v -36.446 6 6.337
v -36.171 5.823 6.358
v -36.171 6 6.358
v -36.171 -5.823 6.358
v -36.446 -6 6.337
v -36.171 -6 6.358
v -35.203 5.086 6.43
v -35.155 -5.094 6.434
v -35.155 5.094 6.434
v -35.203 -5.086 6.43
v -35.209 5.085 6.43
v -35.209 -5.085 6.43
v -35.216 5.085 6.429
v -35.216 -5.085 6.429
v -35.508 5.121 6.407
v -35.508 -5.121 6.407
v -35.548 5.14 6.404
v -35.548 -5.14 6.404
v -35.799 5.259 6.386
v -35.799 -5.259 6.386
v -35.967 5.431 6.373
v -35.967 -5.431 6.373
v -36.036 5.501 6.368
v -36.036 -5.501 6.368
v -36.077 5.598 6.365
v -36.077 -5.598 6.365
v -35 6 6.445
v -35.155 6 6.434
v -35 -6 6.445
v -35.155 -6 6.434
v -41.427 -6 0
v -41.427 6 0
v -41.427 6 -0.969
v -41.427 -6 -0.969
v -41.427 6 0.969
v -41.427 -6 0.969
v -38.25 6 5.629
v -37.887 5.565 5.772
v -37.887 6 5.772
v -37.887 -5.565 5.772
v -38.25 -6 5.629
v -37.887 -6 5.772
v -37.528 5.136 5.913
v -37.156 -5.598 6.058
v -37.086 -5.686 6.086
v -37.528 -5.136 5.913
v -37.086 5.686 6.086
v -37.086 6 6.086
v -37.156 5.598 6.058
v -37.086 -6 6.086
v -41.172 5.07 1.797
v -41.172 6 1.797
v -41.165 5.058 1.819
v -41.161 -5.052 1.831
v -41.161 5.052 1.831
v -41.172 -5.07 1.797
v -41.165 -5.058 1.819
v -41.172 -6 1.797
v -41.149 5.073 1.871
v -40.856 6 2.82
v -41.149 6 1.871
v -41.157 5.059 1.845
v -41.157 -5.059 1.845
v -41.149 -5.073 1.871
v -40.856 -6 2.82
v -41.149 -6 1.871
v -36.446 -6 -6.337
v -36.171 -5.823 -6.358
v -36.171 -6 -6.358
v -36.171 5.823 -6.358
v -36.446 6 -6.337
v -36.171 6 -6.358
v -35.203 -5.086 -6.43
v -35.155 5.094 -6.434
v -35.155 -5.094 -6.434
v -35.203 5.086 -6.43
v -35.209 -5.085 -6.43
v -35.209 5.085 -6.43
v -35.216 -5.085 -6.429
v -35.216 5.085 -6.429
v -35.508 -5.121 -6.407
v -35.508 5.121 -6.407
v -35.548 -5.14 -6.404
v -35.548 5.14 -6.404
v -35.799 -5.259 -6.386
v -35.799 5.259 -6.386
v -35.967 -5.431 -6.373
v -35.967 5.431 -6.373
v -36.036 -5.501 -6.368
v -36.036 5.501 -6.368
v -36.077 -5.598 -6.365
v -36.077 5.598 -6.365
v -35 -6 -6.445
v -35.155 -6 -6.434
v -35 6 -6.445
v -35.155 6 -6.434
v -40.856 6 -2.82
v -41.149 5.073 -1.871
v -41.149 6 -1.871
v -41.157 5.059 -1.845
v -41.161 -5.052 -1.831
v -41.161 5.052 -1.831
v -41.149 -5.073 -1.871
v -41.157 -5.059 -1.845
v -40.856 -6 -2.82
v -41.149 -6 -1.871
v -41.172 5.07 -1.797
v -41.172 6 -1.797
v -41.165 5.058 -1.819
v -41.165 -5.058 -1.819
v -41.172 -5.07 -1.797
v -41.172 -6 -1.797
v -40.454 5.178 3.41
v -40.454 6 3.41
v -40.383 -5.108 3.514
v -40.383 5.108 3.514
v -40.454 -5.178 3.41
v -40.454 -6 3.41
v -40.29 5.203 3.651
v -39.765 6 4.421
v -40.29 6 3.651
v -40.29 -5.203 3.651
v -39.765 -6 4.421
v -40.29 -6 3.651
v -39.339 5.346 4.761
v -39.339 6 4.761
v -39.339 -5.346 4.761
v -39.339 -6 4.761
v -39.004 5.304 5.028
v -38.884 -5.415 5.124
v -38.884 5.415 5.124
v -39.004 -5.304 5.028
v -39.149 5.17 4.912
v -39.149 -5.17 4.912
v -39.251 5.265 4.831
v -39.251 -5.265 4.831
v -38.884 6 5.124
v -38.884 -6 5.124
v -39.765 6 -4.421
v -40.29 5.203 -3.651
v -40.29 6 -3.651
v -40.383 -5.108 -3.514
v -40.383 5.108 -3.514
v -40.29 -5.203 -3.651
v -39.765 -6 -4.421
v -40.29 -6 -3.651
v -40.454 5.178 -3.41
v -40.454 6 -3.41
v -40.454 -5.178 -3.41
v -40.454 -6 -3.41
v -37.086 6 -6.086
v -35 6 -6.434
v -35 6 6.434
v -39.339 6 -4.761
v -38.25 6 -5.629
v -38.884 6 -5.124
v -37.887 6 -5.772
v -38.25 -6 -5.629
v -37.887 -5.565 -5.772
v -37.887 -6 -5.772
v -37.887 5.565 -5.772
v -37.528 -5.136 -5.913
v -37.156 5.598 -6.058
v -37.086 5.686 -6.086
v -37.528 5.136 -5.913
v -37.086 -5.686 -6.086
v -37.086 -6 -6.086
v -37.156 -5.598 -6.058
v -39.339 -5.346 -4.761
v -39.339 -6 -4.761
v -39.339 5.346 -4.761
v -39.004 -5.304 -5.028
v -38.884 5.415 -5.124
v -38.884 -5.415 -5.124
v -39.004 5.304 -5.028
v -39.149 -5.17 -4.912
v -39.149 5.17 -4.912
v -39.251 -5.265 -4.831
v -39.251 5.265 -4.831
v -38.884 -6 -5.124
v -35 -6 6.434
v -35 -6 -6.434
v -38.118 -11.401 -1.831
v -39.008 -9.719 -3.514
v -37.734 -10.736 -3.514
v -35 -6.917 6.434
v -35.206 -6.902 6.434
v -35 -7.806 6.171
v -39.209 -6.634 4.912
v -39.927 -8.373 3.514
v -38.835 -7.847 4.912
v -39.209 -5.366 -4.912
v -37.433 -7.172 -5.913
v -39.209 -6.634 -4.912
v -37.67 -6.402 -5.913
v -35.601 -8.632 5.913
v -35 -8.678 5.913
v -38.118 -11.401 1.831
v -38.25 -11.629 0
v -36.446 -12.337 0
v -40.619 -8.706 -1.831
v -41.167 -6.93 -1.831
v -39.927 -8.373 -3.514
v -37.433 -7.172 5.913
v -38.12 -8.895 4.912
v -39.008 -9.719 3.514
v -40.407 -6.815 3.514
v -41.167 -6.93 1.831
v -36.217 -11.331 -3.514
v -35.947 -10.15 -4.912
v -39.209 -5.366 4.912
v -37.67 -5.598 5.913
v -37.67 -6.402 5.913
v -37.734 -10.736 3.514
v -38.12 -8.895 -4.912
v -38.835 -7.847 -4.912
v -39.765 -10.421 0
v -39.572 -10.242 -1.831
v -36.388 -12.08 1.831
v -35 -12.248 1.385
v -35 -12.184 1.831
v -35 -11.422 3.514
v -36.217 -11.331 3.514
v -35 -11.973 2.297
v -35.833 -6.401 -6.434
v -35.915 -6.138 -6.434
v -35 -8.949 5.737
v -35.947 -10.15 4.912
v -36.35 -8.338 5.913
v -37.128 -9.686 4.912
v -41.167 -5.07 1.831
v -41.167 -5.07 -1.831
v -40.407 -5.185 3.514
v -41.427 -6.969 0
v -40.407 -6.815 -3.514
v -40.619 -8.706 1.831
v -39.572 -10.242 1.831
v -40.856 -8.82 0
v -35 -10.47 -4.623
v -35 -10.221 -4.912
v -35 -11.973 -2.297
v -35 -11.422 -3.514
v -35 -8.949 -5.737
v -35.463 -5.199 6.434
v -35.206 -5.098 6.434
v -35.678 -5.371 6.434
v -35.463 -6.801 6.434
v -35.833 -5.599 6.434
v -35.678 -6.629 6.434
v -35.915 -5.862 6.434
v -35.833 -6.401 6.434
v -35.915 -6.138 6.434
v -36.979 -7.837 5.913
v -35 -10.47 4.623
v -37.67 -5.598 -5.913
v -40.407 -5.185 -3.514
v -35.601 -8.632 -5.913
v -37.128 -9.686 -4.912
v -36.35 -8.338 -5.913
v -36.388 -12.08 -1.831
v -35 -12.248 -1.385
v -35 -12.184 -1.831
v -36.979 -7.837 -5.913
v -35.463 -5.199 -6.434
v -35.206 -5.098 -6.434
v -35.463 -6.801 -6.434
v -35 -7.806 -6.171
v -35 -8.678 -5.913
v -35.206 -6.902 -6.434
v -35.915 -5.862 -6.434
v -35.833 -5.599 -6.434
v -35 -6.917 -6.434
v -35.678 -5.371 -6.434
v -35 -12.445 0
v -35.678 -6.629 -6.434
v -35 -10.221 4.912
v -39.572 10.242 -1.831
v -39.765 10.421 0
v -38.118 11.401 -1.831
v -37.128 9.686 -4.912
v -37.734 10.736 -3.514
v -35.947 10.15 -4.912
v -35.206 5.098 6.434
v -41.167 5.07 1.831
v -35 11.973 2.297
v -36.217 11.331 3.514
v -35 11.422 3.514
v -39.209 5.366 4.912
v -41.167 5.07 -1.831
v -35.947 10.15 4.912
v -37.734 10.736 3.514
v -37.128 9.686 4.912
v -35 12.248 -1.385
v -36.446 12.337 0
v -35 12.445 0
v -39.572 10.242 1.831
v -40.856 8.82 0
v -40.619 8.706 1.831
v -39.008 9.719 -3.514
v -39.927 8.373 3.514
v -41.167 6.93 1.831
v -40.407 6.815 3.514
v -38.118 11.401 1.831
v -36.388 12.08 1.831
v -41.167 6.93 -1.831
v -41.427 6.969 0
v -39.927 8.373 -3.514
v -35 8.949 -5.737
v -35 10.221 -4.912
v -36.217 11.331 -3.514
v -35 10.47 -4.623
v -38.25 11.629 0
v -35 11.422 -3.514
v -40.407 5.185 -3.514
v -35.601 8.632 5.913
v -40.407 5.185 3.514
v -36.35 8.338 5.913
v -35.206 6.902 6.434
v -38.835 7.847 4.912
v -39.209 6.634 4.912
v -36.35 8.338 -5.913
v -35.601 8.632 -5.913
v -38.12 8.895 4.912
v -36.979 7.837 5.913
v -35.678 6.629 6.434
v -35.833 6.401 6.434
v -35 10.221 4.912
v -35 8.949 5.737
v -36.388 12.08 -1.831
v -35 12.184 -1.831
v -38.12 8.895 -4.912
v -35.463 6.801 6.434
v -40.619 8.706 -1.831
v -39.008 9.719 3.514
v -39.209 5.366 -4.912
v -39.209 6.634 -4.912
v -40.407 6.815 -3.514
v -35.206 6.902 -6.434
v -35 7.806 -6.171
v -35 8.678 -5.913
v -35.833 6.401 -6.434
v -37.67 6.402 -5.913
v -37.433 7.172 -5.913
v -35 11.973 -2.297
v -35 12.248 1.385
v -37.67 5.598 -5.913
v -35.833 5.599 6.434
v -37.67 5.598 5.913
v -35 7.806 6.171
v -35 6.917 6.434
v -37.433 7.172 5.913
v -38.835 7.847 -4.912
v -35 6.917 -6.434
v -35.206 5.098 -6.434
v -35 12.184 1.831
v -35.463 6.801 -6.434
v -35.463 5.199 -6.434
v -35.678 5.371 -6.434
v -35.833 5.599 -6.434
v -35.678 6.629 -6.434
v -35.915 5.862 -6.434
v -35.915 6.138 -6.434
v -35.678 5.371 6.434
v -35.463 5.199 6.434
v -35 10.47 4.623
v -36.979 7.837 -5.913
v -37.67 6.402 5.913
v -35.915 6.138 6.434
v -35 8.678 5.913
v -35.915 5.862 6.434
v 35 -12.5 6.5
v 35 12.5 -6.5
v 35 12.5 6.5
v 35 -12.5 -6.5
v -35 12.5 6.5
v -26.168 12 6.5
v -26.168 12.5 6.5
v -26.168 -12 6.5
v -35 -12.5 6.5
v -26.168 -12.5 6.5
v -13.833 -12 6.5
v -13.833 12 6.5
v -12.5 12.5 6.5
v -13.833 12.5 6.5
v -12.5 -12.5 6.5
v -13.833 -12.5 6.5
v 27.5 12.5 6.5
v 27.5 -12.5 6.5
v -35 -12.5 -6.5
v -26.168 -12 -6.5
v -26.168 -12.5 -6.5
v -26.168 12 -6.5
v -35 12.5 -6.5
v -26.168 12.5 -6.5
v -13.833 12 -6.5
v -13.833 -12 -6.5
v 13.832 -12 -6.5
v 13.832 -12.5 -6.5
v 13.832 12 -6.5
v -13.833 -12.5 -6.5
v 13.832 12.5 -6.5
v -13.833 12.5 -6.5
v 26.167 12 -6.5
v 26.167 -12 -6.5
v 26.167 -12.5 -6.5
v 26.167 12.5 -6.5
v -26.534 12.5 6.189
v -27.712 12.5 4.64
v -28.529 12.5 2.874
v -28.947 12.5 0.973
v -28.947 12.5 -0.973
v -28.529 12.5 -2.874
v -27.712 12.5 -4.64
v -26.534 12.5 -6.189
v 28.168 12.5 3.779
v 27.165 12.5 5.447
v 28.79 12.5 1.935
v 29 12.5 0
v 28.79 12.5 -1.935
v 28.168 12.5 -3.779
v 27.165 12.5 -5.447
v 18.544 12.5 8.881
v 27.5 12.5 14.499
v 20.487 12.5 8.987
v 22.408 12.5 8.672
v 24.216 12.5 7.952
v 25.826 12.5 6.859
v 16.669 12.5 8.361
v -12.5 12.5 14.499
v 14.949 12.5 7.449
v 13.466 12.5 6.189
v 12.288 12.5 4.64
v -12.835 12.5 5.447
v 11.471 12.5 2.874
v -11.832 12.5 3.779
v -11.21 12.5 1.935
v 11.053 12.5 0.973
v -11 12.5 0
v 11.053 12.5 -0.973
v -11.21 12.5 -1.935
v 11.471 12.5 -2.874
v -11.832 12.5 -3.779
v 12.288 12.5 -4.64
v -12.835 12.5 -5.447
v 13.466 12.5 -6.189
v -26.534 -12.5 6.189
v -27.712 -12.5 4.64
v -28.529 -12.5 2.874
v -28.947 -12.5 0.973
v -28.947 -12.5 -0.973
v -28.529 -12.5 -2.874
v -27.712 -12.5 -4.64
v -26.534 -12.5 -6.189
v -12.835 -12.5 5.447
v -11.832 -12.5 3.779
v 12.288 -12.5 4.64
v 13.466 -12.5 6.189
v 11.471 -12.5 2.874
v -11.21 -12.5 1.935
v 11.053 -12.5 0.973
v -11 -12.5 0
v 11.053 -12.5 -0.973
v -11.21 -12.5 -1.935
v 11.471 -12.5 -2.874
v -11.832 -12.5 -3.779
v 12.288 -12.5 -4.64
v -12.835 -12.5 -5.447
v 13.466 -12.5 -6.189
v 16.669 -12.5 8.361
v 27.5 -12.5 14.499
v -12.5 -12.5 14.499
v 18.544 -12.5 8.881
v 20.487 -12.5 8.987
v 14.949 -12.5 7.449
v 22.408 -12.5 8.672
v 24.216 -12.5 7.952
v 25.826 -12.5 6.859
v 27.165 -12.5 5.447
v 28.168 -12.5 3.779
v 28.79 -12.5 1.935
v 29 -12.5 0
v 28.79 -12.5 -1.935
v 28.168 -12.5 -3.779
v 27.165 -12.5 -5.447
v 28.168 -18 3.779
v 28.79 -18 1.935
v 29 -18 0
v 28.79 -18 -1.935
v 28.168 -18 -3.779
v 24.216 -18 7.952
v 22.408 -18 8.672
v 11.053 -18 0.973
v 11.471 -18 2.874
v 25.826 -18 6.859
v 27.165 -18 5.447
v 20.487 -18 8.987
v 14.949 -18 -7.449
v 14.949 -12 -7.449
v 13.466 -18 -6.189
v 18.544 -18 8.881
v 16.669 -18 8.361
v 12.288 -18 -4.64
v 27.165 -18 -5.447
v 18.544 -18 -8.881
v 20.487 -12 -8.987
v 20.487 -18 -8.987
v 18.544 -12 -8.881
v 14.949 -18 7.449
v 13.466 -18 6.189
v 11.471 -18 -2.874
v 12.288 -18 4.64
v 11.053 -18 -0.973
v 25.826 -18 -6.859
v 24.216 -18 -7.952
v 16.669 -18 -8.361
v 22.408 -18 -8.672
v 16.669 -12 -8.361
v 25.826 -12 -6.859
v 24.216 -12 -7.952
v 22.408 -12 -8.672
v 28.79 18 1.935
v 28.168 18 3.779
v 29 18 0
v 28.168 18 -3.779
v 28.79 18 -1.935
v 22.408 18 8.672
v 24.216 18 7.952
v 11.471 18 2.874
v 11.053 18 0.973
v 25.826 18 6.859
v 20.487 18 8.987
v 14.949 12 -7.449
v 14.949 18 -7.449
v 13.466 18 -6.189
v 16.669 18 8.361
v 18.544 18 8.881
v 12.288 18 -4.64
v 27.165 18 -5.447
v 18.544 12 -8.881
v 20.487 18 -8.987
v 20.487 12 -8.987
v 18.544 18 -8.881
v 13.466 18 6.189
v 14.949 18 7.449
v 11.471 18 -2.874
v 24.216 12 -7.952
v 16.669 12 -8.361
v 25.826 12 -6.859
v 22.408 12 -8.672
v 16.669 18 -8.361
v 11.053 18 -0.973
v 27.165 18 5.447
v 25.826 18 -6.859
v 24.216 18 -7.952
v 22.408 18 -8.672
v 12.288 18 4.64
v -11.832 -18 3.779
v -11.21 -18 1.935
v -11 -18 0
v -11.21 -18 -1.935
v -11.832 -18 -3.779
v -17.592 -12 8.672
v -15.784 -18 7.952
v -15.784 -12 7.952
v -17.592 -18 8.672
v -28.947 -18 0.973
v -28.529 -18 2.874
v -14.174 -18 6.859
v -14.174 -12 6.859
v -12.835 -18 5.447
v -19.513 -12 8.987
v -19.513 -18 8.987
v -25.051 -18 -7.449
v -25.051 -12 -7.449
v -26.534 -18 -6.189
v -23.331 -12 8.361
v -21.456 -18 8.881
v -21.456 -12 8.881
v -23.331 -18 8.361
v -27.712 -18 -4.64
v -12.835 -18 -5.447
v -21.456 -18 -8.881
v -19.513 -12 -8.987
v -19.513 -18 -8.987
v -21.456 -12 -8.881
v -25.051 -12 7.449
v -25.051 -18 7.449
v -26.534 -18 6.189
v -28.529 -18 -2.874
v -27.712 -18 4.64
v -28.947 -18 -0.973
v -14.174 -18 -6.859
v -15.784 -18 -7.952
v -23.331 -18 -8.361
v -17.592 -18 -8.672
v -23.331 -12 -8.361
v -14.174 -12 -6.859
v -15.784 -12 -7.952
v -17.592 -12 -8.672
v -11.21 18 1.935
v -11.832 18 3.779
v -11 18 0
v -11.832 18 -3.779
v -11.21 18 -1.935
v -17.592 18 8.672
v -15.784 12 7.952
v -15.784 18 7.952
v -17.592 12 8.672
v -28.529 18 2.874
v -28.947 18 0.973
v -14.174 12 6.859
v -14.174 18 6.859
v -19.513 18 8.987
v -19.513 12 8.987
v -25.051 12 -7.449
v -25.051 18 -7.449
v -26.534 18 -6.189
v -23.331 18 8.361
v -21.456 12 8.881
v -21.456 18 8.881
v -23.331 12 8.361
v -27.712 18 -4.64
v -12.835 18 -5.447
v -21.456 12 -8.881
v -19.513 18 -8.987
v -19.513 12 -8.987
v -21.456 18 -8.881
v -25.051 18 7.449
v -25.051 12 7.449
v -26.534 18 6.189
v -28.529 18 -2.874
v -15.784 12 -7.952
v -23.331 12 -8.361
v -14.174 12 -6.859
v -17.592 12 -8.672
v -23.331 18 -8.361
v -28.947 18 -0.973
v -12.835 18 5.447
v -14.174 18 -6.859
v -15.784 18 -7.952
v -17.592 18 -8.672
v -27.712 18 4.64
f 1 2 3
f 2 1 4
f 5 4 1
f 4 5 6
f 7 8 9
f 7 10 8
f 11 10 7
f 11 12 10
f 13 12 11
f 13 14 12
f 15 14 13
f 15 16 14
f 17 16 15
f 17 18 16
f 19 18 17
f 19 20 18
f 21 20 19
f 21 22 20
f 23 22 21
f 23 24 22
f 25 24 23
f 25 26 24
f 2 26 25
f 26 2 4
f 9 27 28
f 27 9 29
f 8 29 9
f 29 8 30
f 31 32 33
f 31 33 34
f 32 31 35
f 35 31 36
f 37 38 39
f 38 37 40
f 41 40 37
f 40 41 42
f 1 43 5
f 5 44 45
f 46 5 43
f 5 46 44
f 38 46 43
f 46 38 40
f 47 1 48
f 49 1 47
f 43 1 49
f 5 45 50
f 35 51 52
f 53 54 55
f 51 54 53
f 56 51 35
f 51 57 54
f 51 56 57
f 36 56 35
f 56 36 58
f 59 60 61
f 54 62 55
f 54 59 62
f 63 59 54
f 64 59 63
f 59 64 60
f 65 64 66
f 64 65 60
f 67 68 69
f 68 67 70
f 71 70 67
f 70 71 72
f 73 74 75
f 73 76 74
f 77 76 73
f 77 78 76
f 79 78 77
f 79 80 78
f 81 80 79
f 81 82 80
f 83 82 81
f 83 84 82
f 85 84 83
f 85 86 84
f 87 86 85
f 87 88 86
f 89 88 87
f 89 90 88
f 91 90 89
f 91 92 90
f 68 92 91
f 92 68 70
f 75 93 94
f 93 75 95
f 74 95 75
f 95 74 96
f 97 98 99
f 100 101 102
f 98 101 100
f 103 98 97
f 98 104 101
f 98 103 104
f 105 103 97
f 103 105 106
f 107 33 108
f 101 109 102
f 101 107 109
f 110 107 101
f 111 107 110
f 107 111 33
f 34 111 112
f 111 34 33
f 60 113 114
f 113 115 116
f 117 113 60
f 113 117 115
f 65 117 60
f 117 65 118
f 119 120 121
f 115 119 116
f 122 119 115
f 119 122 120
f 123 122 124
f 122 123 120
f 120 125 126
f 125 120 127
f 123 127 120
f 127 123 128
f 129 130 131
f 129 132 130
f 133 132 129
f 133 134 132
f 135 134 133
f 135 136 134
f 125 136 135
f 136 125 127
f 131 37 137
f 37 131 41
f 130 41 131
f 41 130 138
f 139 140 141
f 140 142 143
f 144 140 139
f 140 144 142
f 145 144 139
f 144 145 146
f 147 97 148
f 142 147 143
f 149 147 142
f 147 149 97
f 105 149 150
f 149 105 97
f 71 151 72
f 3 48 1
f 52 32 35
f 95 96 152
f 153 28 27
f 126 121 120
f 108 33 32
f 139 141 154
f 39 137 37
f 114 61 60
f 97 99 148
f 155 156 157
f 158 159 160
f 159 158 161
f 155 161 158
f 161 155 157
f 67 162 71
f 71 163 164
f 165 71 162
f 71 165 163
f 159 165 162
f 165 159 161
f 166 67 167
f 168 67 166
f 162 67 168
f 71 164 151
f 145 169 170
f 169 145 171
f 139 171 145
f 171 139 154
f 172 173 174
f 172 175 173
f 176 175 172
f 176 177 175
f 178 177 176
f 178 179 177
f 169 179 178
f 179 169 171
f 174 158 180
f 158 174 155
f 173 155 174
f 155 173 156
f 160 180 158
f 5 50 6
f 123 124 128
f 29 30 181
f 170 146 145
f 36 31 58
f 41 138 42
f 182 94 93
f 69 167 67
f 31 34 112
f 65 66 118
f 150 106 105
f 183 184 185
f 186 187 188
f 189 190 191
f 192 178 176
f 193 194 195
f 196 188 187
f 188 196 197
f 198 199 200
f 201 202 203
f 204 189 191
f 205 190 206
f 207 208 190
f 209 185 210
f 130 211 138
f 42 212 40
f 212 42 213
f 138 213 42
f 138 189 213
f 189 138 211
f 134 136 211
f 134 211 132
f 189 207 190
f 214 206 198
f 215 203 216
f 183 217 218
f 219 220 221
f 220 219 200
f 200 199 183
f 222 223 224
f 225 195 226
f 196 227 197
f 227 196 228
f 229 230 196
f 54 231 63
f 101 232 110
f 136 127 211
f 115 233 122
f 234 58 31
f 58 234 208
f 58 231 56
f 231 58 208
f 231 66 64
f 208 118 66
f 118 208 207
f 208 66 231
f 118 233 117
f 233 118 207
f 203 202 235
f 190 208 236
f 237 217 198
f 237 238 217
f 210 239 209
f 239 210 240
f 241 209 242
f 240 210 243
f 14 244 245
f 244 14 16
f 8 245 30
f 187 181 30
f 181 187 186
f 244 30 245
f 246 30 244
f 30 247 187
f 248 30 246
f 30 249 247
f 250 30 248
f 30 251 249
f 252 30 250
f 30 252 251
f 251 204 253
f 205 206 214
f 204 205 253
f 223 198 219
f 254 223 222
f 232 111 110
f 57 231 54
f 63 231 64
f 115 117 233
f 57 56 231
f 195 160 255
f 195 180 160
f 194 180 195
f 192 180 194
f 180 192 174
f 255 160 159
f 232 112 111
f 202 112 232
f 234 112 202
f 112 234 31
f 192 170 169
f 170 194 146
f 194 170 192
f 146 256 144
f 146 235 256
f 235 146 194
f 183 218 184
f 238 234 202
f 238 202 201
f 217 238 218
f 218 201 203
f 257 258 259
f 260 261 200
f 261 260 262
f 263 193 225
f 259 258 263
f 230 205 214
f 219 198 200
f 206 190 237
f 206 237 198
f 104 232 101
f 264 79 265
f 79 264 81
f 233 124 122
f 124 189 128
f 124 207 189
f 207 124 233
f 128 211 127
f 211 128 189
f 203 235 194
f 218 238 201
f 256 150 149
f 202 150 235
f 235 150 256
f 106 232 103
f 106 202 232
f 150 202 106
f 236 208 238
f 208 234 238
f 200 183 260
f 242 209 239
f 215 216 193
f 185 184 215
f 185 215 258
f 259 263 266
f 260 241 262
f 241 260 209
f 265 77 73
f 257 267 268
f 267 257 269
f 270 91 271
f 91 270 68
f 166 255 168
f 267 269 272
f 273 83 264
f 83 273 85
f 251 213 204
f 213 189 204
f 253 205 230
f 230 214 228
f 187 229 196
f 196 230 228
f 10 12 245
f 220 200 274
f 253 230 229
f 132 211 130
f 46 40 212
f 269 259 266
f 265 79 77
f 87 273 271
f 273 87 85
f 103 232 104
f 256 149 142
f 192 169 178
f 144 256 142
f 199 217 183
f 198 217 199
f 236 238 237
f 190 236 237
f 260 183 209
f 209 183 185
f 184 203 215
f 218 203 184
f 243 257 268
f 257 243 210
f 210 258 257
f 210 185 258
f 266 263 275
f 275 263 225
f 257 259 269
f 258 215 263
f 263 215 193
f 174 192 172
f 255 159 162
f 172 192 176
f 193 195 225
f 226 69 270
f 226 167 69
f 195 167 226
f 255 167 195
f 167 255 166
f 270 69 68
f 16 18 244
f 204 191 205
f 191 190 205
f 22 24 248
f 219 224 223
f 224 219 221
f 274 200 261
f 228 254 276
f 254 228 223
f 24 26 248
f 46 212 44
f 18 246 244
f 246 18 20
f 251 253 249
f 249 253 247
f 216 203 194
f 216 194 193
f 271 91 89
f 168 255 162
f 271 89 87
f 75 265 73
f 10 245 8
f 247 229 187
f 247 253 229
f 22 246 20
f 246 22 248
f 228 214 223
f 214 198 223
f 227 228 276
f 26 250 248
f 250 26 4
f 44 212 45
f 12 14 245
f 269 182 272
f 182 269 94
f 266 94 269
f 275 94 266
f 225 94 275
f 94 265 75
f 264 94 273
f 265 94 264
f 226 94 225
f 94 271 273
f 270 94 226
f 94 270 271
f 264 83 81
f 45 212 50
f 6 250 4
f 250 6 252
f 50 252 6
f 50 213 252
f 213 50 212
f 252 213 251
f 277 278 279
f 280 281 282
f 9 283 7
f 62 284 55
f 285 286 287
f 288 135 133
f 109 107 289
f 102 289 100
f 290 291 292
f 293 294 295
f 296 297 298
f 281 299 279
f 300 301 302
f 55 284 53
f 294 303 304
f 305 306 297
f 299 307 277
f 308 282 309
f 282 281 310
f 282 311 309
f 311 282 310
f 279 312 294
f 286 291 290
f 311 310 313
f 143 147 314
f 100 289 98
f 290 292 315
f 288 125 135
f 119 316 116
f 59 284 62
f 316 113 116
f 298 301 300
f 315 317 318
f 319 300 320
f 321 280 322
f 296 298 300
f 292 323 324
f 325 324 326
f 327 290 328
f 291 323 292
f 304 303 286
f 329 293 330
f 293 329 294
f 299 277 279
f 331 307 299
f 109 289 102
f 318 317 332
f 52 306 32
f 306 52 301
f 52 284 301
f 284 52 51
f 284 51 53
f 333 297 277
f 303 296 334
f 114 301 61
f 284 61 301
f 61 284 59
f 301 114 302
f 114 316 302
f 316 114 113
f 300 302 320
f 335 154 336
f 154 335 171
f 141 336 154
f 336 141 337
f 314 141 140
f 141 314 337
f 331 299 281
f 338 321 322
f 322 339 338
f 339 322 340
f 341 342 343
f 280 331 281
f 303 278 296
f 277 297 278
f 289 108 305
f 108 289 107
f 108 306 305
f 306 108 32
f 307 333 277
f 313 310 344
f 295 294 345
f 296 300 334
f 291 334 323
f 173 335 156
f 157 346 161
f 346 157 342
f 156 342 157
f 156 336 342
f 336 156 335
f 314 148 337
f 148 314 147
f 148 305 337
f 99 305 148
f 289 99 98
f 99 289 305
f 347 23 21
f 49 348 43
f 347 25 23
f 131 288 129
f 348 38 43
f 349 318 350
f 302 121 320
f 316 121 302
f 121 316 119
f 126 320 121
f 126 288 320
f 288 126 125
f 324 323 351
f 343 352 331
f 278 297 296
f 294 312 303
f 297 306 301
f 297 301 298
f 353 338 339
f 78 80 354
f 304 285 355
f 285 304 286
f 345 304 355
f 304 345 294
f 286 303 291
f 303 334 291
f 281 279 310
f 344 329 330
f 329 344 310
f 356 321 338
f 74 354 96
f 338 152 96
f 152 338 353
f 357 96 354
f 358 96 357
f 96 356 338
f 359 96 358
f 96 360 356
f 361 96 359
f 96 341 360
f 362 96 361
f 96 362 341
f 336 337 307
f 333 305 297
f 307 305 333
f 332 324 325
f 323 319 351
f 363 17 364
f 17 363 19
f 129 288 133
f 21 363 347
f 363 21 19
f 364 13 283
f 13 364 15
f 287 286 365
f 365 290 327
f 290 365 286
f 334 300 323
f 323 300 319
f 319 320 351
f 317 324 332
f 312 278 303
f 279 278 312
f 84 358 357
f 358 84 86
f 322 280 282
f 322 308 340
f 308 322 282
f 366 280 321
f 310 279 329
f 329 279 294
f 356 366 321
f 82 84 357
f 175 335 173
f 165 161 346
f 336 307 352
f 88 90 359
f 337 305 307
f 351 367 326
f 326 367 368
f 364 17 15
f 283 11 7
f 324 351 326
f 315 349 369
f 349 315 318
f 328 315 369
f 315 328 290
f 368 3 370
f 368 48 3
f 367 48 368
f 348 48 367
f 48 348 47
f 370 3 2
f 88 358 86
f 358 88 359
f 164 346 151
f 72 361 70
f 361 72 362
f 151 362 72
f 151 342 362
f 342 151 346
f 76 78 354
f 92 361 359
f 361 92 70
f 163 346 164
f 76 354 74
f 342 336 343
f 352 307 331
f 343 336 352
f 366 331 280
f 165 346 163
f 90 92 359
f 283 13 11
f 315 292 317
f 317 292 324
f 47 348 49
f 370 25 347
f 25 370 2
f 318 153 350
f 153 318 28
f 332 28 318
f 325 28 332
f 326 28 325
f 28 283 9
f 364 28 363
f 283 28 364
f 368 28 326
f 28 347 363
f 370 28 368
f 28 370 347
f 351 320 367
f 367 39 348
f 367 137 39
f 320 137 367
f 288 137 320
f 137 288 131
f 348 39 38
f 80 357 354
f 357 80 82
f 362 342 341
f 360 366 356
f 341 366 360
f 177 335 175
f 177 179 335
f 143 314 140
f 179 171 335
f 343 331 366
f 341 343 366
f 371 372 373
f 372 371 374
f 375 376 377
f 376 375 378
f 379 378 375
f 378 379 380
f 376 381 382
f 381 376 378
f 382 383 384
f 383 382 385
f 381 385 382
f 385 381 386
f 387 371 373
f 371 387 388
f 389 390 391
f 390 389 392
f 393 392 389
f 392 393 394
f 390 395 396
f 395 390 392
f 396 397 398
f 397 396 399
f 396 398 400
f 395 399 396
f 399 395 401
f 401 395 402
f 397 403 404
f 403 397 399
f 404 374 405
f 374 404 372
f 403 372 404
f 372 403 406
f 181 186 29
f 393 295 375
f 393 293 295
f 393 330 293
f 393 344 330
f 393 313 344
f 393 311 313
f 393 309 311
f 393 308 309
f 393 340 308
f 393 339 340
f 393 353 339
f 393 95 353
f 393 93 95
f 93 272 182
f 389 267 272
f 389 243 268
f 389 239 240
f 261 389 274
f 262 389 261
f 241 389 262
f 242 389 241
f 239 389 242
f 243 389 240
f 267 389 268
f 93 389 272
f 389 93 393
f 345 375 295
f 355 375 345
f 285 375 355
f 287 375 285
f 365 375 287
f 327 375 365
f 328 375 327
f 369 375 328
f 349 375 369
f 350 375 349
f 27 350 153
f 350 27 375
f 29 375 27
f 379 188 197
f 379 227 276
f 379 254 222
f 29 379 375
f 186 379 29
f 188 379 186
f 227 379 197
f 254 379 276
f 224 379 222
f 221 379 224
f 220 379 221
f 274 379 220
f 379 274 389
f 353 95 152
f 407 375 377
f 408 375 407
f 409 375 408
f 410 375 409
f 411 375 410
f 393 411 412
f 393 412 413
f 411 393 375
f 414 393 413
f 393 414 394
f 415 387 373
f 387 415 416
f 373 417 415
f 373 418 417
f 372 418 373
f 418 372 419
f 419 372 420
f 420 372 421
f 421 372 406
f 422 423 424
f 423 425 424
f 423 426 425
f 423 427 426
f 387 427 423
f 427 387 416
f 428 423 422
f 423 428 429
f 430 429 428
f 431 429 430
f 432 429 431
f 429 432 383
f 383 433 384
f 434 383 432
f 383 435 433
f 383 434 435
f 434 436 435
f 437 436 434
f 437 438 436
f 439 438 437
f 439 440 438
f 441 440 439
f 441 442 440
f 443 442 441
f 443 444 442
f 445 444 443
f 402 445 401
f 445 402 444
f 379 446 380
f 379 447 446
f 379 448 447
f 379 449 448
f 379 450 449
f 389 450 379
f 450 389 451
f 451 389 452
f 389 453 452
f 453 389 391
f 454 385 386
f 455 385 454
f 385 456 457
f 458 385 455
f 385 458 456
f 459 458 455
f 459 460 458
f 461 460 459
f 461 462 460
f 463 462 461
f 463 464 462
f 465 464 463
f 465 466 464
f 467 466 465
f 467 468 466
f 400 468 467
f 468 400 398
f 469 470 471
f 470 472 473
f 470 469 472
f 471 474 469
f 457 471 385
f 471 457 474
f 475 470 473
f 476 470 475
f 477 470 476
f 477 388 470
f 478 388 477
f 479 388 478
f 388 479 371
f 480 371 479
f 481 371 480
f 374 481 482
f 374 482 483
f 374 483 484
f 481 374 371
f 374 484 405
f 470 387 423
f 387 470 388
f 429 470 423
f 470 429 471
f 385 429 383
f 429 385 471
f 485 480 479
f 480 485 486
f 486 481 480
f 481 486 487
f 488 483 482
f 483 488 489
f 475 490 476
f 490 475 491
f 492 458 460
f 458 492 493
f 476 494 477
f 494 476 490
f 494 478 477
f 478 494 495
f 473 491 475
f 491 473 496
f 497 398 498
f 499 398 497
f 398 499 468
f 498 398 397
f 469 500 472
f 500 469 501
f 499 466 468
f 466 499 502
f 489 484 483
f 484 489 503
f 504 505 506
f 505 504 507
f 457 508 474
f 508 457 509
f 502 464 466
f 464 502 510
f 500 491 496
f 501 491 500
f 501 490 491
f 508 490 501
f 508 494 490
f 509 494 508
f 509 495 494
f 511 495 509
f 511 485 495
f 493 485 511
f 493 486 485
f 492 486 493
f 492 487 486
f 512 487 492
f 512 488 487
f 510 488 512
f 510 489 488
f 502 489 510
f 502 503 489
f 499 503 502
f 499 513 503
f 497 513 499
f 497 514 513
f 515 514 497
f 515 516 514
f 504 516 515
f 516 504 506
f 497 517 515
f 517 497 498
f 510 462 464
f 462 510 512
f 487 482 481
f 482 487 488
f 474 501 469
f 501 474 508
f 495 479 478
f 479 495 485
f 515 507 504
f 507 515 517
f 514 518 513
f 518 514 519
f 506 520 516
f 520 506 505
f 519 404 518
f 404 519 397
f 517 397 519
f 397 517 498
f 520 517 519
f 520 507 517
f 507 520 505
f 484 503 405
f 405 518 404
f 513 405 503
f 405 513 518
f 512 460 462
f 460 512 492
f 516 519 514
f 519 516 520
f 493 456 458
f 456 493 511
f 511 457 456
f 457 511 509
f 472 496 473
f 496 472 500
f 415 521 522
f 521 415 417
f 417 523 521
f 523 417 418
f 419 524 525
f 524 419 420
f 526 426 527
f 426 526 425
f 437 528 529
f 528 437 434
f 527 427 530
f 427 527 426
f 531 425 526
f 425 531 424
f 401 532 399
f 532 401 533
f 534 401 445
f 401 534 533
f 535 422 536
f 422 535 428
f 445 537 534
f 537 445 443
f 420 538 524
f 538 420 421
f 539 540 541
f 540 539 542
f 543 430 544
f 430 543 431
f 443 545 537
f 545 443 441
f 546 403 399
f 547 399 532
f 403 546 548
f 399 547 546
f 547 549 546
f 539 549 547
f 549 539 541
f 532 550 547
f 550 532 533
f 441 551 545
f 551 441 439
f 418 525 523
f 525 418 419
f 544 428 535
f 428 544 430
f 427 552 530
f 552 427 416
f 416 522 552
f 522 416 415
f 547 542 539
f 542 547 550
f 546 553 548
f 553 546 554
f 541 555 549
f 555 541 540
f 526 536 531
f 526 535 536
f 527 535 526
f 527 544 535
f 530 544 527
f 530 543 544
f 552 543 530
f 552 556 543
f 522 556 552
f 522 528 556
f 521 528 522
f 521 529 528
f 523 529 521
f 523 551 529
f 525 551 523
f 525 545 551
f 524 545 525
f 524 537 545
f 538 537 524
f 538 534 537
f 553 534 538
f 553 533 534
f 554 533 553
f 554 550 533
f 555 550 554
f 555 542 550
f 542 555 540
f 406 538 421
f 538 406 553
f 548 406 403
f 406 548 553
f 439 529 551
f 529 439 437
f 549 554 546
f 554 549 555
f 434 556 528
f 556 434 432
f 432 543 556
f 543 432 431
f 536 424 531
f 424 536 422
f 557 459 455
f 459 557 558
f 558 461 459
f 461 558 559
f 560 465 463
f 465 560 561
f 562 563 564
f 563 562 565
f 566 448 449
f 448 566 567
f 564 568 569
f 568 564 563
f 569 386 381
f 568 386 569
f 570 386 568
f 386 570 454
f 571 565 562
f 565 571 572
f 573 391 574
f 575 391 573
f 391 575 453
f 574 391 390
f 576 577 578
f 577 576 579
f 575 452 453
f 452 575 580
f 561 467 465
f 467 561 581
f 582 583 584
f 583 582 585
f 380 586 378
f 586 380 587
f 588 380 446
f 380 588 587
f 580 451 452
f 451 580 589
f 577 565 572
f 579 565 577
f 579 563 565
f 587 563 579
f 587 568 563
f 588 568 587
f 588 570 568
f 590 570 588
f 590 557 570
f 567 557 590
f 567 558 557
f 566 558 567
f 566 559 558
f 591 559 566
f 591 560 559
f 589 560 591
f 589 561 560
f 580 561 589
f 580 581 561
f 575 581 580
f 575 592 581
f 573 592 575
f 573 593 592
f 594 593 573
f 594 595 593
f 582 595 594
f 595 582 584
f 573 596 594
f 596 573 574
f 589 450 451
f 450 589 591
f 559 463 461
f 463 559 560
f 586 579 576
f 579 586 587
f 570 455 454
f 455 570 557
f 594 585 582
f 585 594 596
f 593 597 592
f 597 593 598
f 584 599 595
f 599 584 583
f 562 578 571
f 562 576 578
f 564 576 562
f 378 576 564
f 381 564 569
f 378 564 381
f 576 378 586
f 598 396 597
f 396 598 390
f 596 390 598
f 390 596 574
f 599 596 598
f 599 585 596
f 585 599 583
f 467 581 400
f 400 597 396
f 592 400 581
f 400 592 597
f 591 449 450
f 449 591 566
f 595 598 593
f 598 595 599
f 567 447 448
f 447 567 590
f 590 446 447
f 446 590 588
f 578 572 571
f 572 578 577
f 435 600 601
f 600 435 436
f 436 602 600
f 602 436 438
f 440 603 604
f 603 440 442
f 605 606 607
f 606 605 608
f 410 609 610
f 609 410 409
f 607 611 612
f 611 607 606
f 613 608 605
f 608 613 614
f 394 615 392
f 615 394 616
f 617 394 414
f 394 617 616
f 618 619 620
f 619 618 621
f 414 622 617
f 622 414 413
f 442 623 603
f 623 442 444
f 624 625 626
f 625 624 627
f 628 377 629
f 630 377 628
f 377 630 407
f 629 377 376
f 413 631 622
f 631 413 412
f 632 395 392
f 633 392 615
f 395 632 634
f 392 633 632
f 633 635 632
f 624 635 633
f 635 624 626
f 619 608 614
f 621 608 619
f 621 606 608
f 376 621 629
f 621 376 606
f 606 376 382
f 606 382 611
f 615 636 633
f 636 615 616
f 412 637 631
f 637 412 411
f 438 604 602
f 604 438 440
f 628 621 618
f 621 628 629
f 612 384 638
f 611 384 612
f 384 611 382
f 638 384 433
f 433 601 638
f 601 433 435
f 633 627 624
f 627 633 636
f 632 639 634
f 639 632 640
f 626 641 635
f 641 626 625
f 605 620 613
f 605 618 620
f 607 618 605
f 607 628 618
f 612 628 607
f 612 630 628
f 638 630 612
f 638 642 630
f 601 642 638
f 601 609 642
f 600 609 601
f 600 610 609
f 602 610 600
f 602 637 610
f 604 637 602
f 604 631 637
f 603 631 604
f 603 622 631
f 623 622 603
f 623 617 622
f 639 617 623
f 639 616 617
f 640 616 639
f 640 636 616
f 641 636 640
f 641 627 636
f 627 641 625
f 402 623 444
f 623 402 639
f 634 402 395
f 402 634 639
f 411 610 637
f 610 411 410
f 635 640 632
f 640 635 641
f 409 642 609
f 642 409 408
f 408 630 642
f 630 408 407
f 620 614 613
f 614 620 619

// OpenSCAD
// file: vehicle_parts.scad
module body(base_length=80,base_width=25,base_height=13,top_length=35,top_width=25,top_height=8,top_offset=5,top=true,front_bumper=false,rear_bumper=false) {
    //base
    cube([base_length,base_width,base_height],center=true);
    //top
    if(top) {
        translate([top_offset,0,base_height/2+top_height/2 - 0.001])
            cube([top_length,top_width,top_height],center=true);
    }
    //rear bumper
    if(rear_bumper) {
    color("blue") {
        translate([base_length/2,0,0]) {
            rotate([90,0,0])
                cylinder(h=base_width-base_height,r=base_height/2,center=true);
            translate([0,-(base_width-base_height)/2,0])
                sphere(r=base_height/2);
            translate([0,(base_width-base_height)/2,0])
                sphere(r=base_height/2);
        }
    }
    }
    //front bumper
    if(front_bumper) {
    color("blue") {
        translate([-base_length/2,0,0]) {
            rotate([90,0,0])
                cylinder(h=base_width-base_height,r=base_height/2,center=true);
            translate([0,-(base_width-base_height)/2,0])
                sphere(r=base_height/2);
            translate([0,(base_width-base_height)/2,0])
                sphere(r=base_height/2);
        }
    }
    }
}
module simple_wheel(wheel_radius=10,wheel_width=6) {
    rotate([90,0,0])
        cylinder(h=wheel_width, r=wheel_radius, center=true);
}
module complex_wheel(wheel_radius=10, side_spheres_radius=50, hub_thickness=4, cylinder_radius=2) {
    cylinder_height=2*wheel_radius; 
    difference() { 
        // Wheel sphere
        sphere(r=wheel_radius); 
        // Side sphere 1 
        translate([0,side_spheres_radius + hub_thickness/2,0])
            sphere(r=side_spheres_radius); 
        // Side sphere 2 
        translate([0,- (side_spheres_radius + hub_thickness/2),0])
            sphere(r=side_spheres_radius); 
        // Cylinder 1
        translate([wheel_radius/2,0,0])
            rotate([90,0,0])
            cylinder(h=cylinder_height,r=cylinder_radius,center=true); 
        // Cylinder 2 
        translate([0,0,wheel_radius/2])
            rotate([90,0,0])
            cylinder(h=cylinder_height,r=cylinder_radius,center=true); 
        // Cylinder 3 
        translate([-wheel_radius/2,0,0])
            rotate([90,0,0])
            cylinder(h=cylinder_height,r=cylinder_radius,center=true); 
        // Cylinder 4 
        translate([0,0,-wheel_radius/2])
            rotate([90,0,0])
            cylinder(h=cylinder_height,r=cylinder_radius,center=true); 
    }
}
module axle(track=36,radius=2) {
    rotate([90,0,0])
        cylinder(h=track, r=radius, center=true);
}
module axle_wheelset(track=36,radius=2) {
    translate([0,-track/2,0])
        children(0);
    axle(track=track,radius=radius);
    translate([0,track/2,0])
        children(1);
}
module spoked_wheel(radius=20,thickness=3,width=5,number_of_spokes=7,spoke_radius=2) {
    inner_radius=radius-thickness;
    difference() {
        rotate([90,0,0])
            cylinder(h=width,r=radius,center=true);
        rotate([90,0,0])
            cylinder(h=width+1,r=inner_radius,center=true);
    }
    spoke_length=radius-thickness/2;
    for(i=[0:1:number_of_spokes-1]) {
        angle=i*(360/number_of_spokes);
        rotate([0,angle,0])
            cylinder(h=spoke_length, r=spoke_radius);
    }
}
module rounded_simple_wheel(wheel_radius=12,wheel_width=3,tyre_diameter=6,axle_diameter=3) {
    difference() {
        //wheel
        rotate([90,0,0]) {
            rotate_extrude(angle=360) {
                difference() {
                    //cylindrical rim profile
                    translate([0,-wheel_width/2])
                        square([wheel_radius-tyre_diameter/2,wheel_width]);
                    //tyre profile
                    translate([wheel_radius-tyre_diameter/2,0])
                        circle(d=tyre_diameter);
                }
            }
        }
        //axle hole
        rotate([90,0,0])
            cylinder(h=wheel_width+1,r=axle_diameter/2,center=true);
      //cylinder(h=wheel_width,r=wheel_radius-tyre_diameter/2,center=true);
    }
}
module extruded_car_body(length=80,rear_height=20,rear_width=25,scaling_factor=0.5,rounded=false) {
    rotate([0,-90,0])
    linear_extrude(length,center=true,scale=0.5) {
        resize([rear_height,rear_width])
            circle(d=rear_height);
    }
    if(rounded) {
        translate([length/2,0,0])
            //rear part
            resize([rear_height,rear_width,rear_height])
                sphere(d=rear_height);
        translate([-length/2,0,0])
            //front part
            scale([scaling_factor,scaling_factor,scaling_factor])
            resize([rear_height,rear_width,rear_height])
                sphere(d=rear_height);
    }
}
car_length=80;
extruded_car_body(length=car_length,rounded=true);
translate([-car_length/3,0,0])
    axle_wheelset() {
        spoked_wheel();
        spoked_wheel();
    }
translate([car_length/3,0,0])
    axle_wheelset() {
        spoked_wheel();
        spoked_wheel();
    }
//rounded_simple_wheel(wheel_radius=20,wheel_width=6,tyre_diameter=4,axle_diameter=5);
//spoked_wheel();
/*axle_wheelset(radius=5) {
    complex_wheel(wheel_radius=20);
    simple_wheel(wheel_radius=20);
}*/
//body(top=true,front_bumper=true,rear_bumper=false);

//car spoiler
function naca_half_thickness(x,t) = 5*t*(0.2969*sqrt(x) - 0.1260*x - 0.3516*pow(x,2) + 0.2843*pow(x,3) - 0.1015*pow(x,4));
function naca_top_coordinates(t,n) = [for(x=[0:1/(n-1):1]) [x,naca_half_thickness(x,t)]];
function naca_bottom_coordinates(t,n) = [for(x=[1:-1/(n-1):0]) [x,-naca_half_thickness(x,t)]];
function naca_coordinates(t,n) = concat(naca_top_coordinates(t,n), naca_bottom_coordinates(t,n));
module naca_airfoil(chord,t,n) {
    points = naca_coordinates(t=t,n=n);
    scale([chord,chord,1])
        polygon(points);
}
module naca_wing(chord,t,n,span,center=false) {
    linear_extrude(height=span,center=center)
        naca_airfoil(chord,t,n);
}
module car_spoiler(top_chord=20,t=0.12,n=500,top_span=50,base_chord=15,base_span=15,base_gap=10) {
    translate([0,0,0.12+base_span]) {
        rotate([90,0,0])
            naca_wing(chord=top_chord,t=t,n=n,span=top_span,center=true);
        translate([0,base_gap,-base_span])
            naca_wing(chord=base_chord,t=t,n=n,span=base_span);
        translate([0,-base_gap,-base_span])
            naca_wing(chord=base_chord,t=t,n=n,span=base_span);
    }
}
// main file
use <vehicle_parts.scad>
//conditional asigment of body variables
body_version="n";   //s-short, n-normal, l-large, r-rectangular
//base_length
base_length=
(body_version=="l") ? 80:
(body_version=="s") ? 60:
(body_version=="r") ? 65:70;
//top_length
top_length=
(body_version=="l") ? 50:
(body_version=="s") ? 30:
(body_version=="r") ? 65:40;
//top_offset
top_offset=
(body_version=="l") ? 10:
(body_version=="s") ? 5:
(body_version=="r") ? 0:7.5;

top=true;
front_bumper=true;
rear_bumper=false;
//creation of body
body(base_length=base_length,top_length=top_length,top_offset=top_offset,top=top,front_bumper=front_bumper,rear_bumper=rear_bumper);
//conditional assigment of wheel variables
wheels_version="m"; //s-small, m-medium, l-large
//wheel_radius
wheel_radius=
(wheels_version=="l") ? 10:
(wheels_version=="m") ? 9:8;
//wheel_radius
wheel_width=
(wheels_version=="l") ? 8:
(wheels_version=="m") ? 6:4;
track=30;
wheelbase=40;
//creation of wheels and axles
//front axle_wheelset
translate([wheelbase/2,0,0])
    axle_wheelset(track) {
        simple_wheel(wheel_radius=wheel_radius,wheel_width=wheel_width);
        simple_wheel(wheel_radius=wheel_radius,wheel_width=wheel_width);
    }
//rear axle_wheelset
translate([-wheelbase/2,0,0])
    axle_wheelset(track) {
        simple_wheel(wheel_radius=wheel_radius,wheel_width=wheel_width);
        simple_wheel(wheel_radius=wheel_radius,wheel_width=wheel_width);
    }
        
